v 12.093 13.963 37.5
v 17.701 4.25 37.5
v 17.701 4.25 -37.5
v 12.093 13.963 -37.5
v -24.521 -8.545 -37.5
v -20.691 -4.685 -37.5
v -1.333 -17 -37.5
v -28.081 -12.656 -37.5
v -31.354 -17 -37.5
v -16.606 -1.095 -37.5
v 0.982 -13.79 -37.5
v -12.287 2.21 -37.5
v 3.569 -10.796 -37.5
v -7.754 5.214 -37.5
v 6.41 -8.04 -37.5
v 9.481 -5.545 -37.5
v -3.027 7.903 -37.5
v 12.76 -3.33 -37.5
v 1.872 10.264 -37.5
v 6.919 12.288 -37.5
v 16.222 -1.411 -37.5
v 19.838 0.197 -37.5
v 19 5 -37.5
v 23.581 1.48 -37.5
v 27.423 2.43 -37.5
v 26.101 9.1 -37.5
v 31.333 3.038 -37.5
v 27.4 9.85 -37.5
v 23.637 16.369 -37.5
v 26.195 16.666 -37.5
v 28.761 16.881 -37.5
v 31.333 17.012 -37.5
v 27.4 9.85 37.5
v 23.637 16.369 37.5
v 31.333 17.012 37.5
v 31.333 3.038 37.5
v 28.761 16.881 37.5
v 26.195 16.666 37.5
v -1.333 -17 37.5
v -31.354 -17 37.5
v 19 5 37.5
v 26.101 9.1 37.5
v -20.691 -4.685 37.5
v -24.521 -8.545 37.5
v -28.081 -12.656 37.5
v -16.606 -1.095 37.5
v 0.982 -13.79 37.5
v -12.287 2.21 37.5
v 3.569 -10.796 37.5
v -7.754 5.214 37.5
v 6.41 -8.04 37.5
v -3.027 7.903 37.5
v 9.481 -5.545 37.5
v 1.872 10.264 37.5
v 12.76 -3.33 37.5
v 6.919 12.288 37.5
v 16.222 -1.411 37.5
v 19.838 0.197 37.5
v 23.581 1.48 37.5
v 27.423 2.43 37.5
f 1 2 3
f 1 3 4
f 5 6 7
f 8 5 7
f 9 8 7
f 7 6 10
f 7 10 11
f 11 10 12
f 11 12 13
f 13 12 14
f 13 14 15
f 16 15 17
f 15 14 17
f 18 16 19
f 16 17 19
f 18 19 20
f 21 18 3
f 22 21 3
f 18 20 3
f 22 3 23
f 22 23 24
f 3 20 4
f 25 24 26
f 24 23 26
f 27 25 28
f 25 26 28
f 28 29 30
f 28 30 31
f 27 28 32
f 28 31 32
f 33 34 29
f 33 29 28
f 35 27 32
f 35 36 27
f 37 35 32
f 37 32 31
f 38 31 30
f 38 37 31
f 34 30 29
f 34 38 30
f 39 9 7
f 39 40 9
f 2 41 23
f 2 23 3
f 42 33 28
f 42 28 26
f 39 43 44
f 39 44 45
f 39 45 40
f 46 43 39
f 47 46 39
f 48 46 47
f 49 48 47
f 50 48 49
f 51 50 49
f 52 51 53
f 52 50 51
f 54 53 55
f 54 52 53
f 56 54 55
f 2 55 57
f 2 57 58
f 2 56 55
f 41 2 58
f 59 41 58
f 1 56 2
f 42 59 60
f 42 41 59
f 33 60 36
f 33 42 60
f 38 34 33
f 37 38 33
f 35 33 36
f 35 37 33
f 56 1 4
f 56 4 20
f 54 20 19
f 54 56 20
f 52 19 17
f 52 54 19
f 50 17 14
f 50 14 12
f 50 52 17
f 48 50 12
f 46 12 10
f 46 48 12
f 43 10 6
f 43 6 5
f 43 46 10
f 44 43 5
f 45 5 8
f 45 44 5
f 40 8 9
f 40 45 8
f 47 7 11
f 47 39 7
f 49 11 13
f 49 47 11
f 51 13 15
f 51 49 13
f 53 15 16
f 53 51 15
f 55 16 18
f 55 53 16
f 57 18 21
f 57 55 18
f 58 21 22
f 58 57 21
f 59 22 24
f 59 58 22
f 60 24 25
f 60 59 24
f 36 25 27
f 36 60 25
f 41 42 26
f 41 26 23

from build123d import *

# Parameters (mm, degrees)
F1_DEPTH = 37.5


with BuildPart() as f1:
    # F0 (on Top) → F1 (new body, symmetric)
    with BuildSketch(Plane.XY):
        with BuildLine():
            Line((31.333245, 3.038192), (31.333245, 17.012404))
            ThreePointArc((31.333245, 17.012404), (27.477213, 16.783619), (23.63672, 16.368966))
            Line((23.63672, 16.368966), (27.400446, 9.85))
            Line((27.400446, 9.85), (26.101409, 9.1))
            Line((26.101409, 9.1), (18.999999, 5))
            Line((18.999999, 5), (17.700962, 4.25))
            Line((17.700962, 4.25), (12.093028, 13.963227))
            ThreePointArc((12.093028, 13.963227), (-12.287424, 2.210049), (-31.35356, -17.000001))
            Line((-31.35356, -17.000001), (-1.332891, -17.000001))
            ThreePointArc((-1.332891, -17.000001), (12.760499, -3.329794), (31.333245, 3.038192))
        make_face()
    extrude(amount=F1_DEPTH, both=True)


solid = f1.part
